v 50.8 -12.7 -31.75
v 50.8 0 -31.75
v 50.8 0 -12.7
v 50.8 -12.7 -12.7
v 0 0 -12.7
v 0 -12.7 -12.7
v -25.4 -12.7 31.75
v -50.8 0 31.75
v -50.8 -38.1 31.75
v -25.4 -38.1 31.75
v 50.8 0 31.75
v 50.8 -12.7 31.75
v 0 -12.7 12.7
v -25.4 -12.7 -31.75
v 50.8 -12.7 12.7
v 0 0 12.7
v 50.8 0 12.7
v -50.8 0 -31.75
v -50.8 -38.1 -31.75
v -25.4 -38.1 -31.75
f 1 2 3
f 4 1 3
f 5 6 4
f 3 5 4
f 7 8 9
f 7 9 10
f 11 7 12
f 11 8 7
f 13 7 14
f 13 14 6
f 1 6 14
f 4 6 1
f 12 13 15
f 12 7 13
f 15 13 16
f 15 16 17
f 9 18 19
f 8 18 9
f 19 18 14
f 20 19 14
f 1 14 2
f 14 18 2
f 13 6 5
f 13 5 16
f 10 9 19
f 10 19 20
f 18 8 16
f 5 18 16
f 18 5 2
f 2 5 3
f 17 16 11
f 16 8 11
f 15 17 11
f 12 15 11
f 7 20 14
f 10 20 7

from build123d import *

# Parameters (mm, degrees)
F0_W     = 101.6
F0_H     = 63.5
F1_DEPTH = 38.1
F2_W     = 50.8
F2_H     = 25.4
F3_DEPTH = 38.101
F4_W     = 76.2
F4_H     = 63.5
F5_DEPTH = 25.4


with BuildPart() as f1:
    # F0 (on Front) → F1 (new body)
    with BuildSketch(Plane.XZ):
        Rectangle(F0_W, F0_H)
    extrude(amount=F1_DEPTH)

    # F2 (on face) → F3 (cut, through all)
    with BuildSketch(Plane.XZ.offset(38.1)):
        with Locations((25.4, 0)):
            Rectangle(F2_W, F2_H)
    extrude(amount=-F3_DEPTH, mode=Mode.SUBTRACT)

    # F4 (on face) → F5 (cut)
    with BuildSketch(Plane.XZ.offset(38.1)):
        with Locations((12.7, 0)):
            Rectangle(F4_W, F4_H)
    extrude(amount=-F5_DEPTH, mode=Mode.SUBTRACT)


solid = f1.part
